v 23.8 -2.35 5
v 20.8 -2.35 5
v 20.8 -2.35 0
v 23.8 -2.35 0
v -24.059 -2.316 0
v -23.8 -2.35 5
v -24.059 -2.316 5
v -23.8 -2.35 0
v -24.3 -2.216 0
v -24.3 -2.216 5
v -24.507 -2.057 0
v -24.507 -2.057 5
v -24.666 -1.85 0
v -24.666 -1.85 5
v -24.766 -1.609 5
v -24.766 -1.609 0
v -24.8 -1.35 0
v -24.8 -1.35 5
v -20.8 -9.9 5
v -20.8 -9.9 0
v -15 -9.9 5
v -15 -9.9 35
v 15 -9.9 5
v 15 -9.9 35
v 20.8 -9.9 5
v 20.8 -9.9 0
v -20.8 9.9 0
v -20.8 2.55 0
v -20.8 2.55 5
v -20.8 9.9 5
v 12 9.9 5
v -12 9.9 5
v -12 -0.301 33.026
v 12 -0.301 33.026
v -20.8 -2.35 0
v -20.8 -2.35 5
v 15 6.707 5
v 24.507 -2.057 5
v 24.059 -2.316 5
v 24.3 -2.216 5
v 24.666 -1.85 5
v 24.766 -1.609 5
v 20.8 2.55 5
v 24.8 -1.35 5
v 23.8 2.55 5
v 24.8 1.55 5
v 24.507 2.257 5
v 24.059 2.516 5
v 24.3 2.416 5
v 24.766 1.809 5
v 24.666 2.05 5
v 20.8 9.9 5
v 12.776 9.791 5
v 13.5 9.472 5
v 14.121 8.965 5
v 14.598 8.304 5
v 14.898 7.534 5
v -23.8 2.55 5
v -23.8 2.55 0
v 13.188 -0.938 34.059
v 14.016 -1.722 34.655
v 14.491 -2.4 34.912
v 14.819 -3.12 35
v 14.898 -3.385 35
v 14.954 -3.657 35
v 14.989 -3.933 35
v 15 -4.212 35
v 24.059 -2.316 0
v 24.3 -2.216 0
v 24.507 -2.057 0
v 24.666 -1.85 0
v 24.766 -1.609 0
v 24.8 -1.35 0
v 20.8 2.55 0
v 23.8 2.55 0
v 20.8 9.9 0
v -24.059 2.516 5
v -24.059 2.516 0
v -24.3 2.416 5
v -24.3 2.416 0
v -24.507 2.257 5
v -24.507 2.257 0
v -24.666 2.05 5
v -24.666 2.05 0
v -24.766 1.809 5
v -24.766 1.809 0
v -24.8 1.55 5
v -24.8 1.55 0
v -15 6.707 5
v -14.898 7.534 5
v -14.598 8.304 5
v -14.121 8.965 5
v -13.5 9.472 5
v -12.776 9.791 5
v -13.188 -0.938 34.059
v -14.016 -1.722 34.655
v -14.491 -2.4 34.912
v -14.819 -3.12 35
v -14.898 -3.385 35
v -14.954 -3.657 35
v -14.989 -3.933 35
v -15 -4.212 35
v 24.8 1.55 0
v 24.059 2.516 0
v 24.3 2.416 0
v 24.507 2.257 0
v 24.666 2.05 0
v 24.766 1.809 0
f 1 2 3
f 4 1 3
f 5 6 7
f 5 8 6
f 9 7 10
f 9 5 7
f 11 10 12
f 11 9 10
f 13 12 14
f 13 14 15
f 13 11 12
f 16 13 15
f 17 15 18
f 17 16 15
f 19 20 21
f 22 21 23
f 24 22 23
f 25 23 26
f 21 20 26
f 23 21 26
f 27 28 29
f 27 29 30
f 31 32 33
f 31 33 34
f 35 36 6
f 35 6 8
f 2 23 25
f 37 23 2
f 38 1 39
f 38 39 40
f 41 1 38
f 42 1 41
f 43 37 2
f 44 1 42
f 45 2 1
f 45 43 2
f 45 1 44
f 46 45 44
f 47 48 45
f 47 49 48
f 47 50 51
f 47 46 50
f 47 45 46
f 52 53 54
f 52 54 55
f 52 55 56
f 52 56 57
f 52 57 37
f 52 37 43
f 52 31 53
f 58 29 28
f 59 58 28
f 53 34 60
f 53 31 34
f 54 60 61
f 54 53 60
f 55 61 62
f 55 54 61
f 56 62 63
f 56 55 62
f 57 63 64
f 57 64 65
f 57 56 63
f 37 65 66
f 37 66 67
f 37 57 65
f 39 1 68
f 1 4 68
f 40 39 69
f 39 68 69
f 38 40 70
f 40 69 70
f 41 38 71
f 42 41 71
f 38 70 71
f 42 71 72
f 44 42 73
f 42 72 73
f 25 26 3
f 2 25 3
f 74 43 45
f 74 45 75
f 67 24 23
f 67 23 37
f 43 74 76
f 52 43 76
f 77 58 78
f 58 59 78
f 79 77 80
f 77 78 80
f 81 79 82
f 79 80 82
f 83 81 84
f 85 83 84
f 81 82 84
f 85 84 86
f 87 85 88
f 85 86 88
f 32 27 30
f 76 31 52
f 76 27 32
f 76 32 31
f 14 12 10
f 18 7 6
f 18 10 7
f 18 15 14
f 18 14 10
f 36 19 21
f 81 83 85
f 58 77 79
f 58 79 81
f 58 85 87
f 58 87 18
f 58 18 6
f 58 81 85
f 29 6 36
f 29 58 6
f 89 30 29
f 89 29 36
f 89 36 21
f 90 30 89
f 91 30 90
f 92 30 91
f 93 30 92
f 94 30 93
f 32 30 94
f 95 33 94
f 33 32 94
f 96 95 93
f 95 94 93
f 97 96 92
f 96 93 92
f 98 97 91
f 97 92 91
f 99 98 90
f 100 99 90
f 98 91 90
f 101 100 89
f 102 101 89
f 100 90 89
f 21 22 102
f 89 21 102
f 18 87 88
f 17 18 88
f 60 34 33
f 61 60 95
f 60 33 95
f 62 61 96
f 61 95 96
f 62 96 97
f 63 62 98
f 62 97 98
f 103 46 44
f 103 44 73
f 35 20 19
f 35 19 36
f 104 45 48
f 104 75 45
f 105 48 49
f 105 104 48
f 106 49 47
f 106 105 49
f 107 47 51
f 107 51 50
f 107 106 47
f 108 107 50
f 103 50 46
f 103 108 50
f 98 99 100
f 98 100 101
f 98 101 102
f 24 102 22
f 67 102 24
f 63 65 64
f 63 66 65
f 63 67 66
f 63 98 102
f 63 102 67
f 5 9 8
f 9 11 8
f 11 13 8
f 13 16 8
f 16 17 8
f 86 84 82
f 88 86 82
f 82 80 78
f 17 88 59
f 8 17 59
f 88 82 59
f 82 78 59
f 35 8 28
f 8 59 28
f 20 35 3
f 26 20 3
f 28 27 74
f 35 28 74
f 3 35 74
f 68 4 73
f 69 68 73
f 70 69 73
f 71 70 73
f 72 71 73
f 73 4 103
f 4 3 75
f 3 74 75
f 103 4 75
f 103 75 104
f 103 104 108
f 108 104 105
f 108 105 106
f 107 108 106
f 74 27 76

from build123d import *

# Parameters (mm, degrees)
SKETCH_1_W             = 41.6
SKETCH_1_H             = 19.8
EXTRUDE_1_DEPTH        = 5
SKETCH_2_W             = 5
SKETCH_2_H             = 4.9
EXTRUDE_2_DEPTH        = 4
FILLET_1_R             = 1
FILLET_1_OF_MIRROR_1_R = 1
SKETCH_3_W             = 30
SKETCH_3_H             = 19.8
EXTRUDE_3_DEPTH        = 30
DRAFT_START            = 11.013057662
DRAFT_1_OUTLINE_W      = 30
DRAFT_1_OUTLINE_H      = 35
DRAFT_1_DEPTH          = 10.2606043
FILLET_2_R             = 3


# Read off the part's stored shape, not the designer's step: 구배1
with BuildPart() as part:
    # 스케치1 → 보스-돌출1 (new body)
    with BuildSketch(Plane.XY):
        Rectangle(SKETCH_1_W, SKETCH_1_H)
    extrude(amount=EXTRUDE_1_DEPTH)

    # 스케치2 → 보스-돌출2 (add)
    with BuildSketch(Plane(origin=(20.8, 0, 0), x_dir=(0, 0, -1), z_dir=(1, 0, 0))):
        with Locations((-2.5, 0.1)):
            Rectangle(SKETCH_2_W, SKETCH_2_H)
    extrude_2 = extrude(amount=EXTRUDE_2_DEPTH)

    # 필렛1
    fillet_1_edges = [part.edges().sort_by_distance(p)[0] for p in [
        (24.8, 2.55, 2.5),
        (24.8, -2.35, 2.5),
    ]]
    fillet(fillet_1_edges, radius=FILLET_1_R)

    # 대칭 복사1: 보스-돌출2 across plane
    add(extrude_2.mirror(Plane(origin=(0, 0, 0), x_dir=(0, 0, 1), z_dir=(1, 0, 0))))

    # 필렛1 of 대칭 복사1
    fillet_1_of_mirror_1_edges = [part.edges().sort_by_distance(p)[0] for p in [
        (-24.8, 2.55, 2.5),
        (-24.8, -2.35, 2.5),
    ]]
    fillet(fillet_1_of_mirror_1_edges, radius=FILLET_1_OF_MIRROR_1_R)

    # 스케치3 → 보스-돌출3 (add)
    with BuildSketch(Plane.XY.offset(5)):
        Rectangle(SKETCH_3_W, SKETCH_3_H)
    extrude(amount=EXTRUDE_3_DEPTH)

    # 구배1 outline → 구배1 (cut)
    with BuildSketch(Plane(origin=(0, 0, 0), x_dir=(1, 0, 0), z_dir=(0, 0.9396926207859083, 0.3420201433256691)).offset(DRAFT_START)):
        with Locations((0, -17.5)):
            Rectangle(DRAFT_1_OUTLINE_W, DRAFT_1_OUTLINE_H)
    extrude(amount=DRAFT_1_DEPTH, mode=Mode.SUBTRACT)

    # 필렛2
    fillet_2_edges = [part.edges().sort_by_distance(p)[0] for p in [
        (15, 4.440446486, 20),
        (-15, 4.440446486, 20),
        (0, -1.019107028, 35),
    ]]
    fillet(fillet_2_edges, radius=FILLET_2_R)


solid = part.part
